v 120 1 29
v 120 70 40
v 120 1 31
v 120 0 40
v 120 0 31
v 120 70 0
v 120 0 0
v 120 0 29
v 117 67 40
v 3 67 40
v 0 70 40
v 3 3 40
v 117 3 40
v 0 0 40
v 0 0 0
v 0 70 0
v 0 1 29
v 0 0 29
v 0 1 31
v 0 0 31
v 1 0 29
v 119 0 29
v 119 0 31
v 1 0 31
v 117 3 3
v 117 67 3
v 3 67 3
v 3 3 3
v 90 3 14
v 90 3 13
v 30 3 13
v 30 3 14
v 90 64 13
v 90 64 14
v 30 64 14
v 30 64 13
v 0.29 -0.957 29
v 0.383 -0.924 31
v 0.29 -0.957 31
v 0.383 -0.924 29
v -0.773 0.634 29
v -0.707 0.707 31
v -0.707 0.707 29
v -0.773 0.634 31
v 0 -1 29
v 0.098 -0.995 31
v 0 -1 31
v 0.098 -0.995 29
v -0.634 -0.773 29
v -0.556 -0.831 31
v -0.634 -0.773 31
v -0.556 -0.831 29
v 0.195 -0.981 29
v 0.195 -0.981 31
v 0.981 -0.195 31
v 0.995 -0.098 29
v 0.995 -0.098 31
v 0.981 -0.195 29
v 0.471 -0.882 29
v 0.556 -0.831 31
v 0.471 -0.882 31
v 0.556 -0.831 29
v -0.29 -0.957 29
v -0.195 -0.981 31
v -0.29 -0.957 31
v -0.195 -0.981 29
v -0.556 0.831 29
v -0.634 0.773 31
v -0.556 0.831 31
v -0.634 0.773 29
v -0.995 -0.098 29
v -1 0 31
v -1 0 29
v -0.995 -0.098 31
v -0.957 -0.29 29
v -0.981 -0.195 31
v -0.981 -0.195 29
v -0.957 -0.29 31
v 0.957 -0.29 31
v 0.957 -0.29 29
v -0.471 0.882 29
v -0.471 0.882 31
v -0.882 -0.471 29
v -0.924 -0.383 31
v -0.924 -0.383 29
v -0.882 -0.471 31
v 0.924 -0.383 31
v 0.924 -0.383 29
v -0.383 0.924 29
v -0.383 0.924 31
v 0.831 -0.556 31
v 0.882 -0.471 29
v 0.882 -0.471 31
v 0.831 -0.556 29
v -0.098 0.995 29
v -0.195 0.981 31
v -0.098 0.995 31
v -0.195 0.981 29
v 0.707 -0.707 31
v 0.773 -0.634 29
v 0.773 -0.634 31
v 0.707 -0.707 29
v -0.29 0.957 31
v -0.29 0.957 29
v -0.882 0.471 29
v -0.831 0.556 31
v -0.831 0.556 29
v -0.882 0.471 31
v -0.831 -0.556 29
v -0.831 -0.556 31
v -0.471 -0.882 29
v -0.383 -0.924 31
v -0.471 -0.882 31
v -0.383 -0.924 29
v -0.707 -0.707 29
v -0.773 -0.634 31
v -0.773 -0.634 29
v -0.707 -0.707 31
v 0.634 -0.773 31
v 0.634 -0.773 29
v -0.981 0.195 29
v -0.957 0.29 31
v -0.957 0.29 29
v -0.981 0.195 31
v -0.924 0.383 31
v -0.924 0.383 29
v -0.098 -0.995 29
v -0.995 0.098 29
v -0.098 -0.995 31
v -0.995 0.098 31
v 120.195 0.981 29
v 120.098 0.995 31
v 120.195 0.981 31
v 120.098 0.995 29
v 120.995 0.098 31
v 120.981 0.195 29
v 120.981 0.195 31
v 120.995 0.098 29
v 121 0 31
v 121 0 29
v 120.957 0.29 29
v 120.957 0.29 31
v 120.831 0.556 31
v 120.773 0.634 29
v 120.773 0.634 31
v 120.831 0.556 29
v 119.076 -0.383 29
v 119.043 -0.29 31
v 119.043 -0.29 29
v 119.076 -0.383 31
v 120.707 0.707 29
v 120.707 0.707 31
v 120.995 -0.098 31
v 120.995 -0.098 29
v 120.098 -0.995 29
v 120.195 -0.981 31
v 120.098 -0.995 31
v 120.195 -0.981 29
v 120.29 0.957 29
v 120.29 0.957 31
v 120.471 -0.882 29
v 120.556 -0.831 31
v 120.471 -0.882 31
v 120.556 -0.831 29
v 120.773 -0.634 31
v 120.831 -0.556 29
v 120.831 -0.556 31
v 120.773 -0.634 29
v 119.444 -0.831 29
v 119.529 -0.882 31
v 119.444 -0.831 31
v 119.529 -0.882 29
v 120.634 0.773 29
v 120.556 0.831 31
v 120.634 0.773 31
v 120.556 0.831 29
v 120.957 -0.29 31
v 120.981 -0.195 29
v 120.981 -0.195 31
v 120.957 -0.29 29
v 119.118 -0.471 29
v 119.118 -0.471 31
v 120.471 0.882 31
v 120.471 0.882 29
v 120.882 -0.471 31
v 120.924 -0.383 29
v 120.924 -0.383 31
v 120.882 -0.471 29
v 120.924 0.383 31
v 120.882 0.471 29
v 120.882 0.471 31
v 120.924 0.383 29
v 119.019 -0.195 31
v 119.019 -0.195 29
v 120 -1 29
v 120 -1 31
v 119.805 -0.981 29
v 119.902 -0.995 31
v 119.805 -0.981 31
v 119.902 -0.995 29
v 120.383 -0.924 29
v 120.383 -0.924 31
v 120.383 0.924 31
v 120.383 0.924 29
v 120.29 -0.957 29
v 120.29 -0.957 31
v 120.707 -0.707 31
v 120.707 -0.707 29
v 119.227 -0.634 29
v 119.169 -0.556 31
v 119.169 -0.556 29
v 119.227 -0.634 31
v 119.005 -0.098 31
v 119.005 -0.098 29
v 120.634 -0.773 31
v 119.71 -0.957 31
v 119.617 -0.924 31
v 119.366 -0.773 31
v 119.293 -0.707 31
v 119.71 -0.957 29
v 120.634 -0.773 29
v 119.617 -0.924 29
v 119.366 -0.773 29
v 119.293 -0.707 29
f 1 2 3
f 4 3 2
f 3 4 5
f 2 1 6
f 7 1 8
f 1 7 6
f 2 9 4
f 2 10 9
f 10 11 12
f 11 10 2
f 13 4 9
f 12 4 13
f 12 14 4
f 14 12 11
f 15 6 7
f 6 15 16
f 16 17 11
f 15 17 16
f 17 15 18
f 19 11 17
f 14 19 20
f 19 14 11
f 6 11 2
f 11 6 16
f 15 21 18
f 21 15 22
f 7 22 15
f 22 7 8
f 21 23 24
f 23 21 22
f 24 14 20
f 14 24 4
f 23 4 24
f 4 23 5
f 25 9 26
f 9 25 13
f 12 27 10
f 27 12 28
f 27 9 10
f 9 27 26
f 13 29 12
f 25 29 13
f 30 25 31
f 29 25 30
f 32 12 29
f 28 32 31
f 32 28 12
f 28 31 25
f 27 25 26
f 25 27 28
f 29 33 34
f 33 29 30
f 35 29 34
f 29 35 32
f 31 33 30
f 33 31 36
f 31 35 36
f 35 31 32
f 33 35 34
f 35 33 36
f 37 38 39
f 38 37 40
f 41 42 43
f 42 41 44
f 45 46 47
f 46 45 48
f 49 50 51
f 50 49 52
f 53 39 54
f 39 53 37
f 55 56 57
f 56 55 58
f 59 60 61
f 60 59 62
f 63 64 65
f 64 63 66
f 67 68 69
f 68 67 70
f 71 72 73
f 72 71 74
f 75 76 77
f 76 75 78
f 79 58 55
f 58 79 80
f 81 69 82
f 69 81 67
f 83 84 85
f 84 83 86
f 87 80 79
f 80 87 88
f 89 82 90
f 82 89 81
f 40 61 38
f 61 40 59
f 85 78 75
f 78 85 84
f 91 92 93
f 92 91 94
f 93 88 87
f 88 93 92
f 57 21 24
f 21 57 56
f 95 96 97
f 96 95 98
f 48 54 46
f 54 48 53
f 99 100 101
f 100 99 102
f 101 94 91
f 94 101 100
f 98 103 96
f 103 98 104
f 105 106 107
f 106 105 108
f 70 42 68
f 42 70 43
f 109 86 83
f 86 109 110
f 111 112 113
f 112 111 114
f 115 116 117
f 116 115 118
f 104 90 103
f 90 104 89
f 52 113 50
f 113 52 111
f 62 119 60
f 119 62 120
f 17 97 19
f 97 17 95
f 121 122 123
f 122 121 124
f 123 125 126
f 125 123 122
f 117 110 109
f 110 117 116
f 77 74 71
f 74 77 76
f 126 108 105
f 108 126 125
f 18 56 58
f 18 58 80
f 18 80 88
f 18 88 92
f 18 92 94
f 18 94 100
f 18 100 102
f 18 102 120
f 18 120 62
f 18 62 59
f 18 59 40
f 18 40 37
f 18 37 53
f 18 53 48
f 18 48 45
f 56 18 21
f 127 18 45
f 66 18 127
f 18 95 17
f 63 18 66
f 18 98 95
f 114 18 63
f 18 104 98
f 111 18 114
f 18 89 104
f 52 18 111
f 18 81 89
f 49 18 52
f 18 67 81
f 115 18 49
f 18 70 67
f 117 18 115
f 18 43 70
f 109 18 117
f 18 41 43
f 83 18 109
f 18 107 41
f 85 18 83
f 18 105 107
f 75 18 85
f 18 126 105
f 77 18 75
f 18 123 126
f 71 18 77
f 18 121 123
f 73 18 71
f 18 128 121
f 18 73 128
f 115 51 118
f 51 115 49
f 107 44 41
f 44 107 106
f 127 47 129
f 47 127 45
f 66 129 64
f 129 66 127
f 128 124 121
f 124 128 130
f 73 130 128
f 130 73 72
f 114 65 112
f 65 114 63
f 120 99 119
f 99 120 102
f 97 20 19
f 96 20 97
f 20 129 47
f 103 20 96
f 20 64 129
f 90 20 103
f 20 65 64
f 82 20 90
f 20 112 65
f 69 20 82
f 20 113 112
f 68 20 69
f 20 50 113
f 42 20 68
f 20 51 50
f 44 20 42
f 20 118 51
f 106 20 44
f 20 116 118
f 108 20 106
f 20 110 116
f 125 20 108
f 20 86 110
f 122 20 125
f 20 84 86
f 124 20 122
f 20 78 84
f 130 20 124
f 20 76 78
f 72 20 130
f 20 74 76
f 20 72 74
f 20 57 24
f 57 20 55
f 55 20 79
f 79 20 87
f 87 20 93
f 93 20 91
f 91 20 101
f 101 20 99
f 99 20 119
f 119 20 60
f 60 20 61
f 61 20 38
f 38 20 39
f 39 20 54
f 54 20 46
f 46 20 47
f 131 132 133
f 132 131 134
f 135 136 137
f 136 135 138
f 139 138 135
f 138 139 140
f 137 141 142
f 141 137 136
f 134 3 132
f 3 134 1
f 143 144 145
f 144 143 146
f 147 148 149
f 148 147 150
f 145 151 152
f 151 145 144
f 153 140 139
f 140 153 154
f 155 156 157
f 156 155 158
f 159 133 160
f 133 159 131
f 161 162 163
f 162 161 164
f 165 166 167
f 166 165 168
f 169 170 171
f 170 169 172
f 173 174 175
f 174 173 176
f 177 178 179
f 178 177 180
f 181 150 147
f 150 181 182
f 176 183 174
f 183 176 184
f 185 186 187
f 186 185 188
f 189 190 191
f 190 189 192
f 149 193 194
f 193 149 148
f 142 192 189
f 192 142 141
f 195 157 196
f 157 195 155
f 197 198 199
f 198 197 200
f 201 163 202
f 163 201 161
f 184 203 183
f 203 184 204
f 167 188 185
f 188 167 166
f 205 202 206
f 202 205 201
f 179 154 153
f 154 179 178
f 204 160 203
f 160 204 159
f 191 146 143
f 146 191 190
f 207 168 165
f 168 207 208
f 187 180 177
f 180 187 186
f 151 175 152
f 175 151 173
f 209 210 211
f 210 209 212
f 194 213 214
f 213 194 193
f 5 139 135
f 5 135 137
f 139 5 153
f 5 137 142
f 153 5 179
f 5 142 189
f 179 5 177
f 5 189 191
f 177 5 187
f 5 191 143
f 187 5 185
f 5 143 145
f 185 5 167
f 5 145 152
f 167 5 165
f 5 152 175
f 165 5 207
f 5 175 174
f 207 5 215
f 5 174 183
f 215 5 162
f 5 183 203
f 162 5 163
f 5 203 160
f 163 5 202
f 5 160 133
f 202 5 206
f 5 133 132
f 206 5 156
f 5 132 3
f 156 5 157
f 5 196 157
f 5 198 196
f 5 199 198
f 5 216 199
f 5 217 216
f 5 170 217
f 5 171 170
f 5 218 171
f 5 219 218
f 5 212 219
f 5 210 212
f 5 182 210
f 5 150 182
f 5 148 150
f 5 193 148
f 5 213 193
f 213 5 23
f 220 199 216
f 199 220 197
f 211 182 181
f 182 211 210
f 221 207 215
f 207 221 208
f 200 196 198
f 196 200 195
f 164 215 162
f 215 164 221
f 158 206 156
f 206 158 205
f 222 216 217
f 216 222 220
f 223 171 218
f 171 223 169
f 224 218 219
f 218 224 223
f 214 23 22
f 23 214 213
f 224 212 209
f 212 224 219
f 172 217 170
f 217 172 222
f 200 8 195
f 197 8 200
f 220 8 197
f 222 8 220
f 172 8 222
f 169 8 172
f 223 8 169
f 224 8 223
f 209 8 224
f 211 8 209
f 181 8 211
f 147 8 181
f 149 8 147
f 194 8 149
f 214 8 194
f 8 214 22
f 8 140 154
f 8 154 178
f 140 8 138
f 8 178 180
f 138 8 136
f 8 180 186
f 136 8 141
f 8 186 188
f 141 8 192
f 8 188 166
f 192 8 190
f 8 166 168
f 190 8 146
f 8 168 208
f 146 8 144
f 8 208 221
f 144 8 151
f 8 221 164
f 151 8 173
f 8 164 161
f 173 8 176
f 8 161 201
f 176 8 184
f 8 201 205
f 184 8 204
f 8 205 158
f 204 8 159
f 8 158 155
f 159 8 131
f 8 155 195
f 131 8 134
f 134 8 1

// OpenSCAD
// Buffer Tank Design for Mini Horizontal Gel-Electrophoresis Box - FINAL CORRECTED VERSION

// --- Dimensions ---
X_outer = 120;    // Outer length of the tank (mm)
Y_outer = 70;     // Outer width of the tank (mm)
Z_outer = 40;     // Outer height of the tank (mm)
Wall_thickness = 3; // Thickness of the walls (mm)
Floor_thickness = 3; // Thickness of the floor (mm)

Platform_length = 60;  // Length of the central platform in X (mm)
Platform_height_above_inner_floor = 10; // Height of the platform above the inner floor (mm)
Hole_diameter = 2; // Diameter of the electrode holes (mm)
Hole_z = 30;      // Z-level for the electrode holes (mm)

// --- Calculated Inner Dimensions ---
Inner_X = X_outer - 2 * Wall_thickness; // 120 - 6 = 114 mm
Inner_Y = Y_outer - 2 * Wall_thickness; // 70 - 6 = 64 mm

// Z-levels
Inner_Z_floor = Floor_thickness; // Inner floor is at z=3 (since floor is at z=0)
Platform_Z = Inner_Z_floor + Platform_height_above_inner_floor; // 3 + 10 = 13 mm

// --- Main Tank Body Construction ---
module tank_shell() {
    difference() {
        // 1. Outer solid block (defines the outer boundary)
        cube([X_outer, Y_outer, Z_outer]);

        // 2. Inner void subtraction (ensures 3mm walls)
        translate([Wall_thickness, Wall_thickness, 0])
        cube([Inner_X, Inner_Y, Z_outer]);
    }
}

// --- Floor Construction ---
module tank_floor() {
    // The floor is at z=0. We model the solid block that forms the base.
    translate([0, 0, 0])
    cube([X_outer, Y_outer, Floor_thickness]);
}

// --- Gel Platform Construction ---
module gel_platform() {
    // The platform spans the full inner width (Inner_Y = 64 mm) and is 60mm long in X, centered.
    // It sits on top of the floor structure.
    translate([ (X_outer - Platform_length) / 2, 0, Platform_Z ])
    cube([Platform_length, Inner_Y, 1]); // A thin block representing the platform structure itself.
}

// --- Electrode Holes ---
module electrode_holes() {
    // Drill a 2mm diameter horizontal hole along X at y = 0 (outer wall) at z = Hole_z for both ends.

    // Hole at X = 0 (Left end wall)
    translate([0, 0, Hole_z - Hole_diameter/2])
    cylinder(r = Hole_diameter / 2, h = 2, $fn = 64);

    // Hole at X = X_outer (Right end wall)
    translate([X_outer, 0, Hole_z - Hole_diameter/2])
    cylinder(r = Hole_diameter / 2, h = 2, $fn = 64);
}


// --- Final Assembly ---
union() {
    tank_shell();
    tank_floor();
    gel_platform();
}

// Add the electrode holes to the final assembly (These are drilled through the shell)
electrode_holes();
